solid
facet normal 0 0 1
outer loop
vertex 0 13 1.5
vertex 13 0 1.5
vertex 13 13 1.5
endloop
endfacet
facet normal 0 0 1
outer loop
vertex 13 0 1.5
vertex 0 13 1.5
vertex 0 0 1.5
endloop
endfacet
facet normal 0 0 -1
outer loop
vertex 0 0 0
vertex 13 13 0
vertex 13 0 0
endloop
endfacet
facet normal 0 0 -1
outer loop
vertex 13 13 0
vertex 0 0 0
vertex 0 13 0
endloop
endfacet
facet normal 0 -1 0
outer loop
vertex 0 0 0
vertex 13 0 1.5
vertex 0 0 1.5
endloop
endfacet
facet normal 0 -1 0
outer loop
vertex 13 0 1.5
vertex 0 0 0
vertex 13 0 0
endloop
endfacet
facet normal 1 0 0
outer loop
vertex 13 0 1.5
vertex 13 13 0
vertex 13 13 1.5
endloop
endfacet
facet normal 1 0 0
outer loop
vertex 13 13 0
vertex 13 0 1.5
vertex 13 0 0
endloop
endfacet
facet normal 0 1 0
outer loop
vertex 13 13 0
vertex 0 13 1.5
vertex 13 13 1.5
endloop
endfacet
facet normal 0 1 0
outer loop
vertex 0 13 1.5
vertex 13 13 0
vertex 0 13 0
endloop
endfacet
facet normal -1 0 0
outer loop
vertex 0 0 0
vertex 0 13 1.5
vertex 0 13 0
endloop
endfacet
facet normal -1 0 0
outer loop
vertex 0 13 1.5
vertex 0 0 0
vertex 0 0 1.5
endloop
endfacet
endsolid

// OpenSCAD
hall_plate_dim=13;
hall_plate_depth=1.5;

hall_head_height=3;
hall_head_width=4;
hall_head_depth=1.5;

cube([hall_plate_dim, hall_plate_dim, hall_plate_depth]);
